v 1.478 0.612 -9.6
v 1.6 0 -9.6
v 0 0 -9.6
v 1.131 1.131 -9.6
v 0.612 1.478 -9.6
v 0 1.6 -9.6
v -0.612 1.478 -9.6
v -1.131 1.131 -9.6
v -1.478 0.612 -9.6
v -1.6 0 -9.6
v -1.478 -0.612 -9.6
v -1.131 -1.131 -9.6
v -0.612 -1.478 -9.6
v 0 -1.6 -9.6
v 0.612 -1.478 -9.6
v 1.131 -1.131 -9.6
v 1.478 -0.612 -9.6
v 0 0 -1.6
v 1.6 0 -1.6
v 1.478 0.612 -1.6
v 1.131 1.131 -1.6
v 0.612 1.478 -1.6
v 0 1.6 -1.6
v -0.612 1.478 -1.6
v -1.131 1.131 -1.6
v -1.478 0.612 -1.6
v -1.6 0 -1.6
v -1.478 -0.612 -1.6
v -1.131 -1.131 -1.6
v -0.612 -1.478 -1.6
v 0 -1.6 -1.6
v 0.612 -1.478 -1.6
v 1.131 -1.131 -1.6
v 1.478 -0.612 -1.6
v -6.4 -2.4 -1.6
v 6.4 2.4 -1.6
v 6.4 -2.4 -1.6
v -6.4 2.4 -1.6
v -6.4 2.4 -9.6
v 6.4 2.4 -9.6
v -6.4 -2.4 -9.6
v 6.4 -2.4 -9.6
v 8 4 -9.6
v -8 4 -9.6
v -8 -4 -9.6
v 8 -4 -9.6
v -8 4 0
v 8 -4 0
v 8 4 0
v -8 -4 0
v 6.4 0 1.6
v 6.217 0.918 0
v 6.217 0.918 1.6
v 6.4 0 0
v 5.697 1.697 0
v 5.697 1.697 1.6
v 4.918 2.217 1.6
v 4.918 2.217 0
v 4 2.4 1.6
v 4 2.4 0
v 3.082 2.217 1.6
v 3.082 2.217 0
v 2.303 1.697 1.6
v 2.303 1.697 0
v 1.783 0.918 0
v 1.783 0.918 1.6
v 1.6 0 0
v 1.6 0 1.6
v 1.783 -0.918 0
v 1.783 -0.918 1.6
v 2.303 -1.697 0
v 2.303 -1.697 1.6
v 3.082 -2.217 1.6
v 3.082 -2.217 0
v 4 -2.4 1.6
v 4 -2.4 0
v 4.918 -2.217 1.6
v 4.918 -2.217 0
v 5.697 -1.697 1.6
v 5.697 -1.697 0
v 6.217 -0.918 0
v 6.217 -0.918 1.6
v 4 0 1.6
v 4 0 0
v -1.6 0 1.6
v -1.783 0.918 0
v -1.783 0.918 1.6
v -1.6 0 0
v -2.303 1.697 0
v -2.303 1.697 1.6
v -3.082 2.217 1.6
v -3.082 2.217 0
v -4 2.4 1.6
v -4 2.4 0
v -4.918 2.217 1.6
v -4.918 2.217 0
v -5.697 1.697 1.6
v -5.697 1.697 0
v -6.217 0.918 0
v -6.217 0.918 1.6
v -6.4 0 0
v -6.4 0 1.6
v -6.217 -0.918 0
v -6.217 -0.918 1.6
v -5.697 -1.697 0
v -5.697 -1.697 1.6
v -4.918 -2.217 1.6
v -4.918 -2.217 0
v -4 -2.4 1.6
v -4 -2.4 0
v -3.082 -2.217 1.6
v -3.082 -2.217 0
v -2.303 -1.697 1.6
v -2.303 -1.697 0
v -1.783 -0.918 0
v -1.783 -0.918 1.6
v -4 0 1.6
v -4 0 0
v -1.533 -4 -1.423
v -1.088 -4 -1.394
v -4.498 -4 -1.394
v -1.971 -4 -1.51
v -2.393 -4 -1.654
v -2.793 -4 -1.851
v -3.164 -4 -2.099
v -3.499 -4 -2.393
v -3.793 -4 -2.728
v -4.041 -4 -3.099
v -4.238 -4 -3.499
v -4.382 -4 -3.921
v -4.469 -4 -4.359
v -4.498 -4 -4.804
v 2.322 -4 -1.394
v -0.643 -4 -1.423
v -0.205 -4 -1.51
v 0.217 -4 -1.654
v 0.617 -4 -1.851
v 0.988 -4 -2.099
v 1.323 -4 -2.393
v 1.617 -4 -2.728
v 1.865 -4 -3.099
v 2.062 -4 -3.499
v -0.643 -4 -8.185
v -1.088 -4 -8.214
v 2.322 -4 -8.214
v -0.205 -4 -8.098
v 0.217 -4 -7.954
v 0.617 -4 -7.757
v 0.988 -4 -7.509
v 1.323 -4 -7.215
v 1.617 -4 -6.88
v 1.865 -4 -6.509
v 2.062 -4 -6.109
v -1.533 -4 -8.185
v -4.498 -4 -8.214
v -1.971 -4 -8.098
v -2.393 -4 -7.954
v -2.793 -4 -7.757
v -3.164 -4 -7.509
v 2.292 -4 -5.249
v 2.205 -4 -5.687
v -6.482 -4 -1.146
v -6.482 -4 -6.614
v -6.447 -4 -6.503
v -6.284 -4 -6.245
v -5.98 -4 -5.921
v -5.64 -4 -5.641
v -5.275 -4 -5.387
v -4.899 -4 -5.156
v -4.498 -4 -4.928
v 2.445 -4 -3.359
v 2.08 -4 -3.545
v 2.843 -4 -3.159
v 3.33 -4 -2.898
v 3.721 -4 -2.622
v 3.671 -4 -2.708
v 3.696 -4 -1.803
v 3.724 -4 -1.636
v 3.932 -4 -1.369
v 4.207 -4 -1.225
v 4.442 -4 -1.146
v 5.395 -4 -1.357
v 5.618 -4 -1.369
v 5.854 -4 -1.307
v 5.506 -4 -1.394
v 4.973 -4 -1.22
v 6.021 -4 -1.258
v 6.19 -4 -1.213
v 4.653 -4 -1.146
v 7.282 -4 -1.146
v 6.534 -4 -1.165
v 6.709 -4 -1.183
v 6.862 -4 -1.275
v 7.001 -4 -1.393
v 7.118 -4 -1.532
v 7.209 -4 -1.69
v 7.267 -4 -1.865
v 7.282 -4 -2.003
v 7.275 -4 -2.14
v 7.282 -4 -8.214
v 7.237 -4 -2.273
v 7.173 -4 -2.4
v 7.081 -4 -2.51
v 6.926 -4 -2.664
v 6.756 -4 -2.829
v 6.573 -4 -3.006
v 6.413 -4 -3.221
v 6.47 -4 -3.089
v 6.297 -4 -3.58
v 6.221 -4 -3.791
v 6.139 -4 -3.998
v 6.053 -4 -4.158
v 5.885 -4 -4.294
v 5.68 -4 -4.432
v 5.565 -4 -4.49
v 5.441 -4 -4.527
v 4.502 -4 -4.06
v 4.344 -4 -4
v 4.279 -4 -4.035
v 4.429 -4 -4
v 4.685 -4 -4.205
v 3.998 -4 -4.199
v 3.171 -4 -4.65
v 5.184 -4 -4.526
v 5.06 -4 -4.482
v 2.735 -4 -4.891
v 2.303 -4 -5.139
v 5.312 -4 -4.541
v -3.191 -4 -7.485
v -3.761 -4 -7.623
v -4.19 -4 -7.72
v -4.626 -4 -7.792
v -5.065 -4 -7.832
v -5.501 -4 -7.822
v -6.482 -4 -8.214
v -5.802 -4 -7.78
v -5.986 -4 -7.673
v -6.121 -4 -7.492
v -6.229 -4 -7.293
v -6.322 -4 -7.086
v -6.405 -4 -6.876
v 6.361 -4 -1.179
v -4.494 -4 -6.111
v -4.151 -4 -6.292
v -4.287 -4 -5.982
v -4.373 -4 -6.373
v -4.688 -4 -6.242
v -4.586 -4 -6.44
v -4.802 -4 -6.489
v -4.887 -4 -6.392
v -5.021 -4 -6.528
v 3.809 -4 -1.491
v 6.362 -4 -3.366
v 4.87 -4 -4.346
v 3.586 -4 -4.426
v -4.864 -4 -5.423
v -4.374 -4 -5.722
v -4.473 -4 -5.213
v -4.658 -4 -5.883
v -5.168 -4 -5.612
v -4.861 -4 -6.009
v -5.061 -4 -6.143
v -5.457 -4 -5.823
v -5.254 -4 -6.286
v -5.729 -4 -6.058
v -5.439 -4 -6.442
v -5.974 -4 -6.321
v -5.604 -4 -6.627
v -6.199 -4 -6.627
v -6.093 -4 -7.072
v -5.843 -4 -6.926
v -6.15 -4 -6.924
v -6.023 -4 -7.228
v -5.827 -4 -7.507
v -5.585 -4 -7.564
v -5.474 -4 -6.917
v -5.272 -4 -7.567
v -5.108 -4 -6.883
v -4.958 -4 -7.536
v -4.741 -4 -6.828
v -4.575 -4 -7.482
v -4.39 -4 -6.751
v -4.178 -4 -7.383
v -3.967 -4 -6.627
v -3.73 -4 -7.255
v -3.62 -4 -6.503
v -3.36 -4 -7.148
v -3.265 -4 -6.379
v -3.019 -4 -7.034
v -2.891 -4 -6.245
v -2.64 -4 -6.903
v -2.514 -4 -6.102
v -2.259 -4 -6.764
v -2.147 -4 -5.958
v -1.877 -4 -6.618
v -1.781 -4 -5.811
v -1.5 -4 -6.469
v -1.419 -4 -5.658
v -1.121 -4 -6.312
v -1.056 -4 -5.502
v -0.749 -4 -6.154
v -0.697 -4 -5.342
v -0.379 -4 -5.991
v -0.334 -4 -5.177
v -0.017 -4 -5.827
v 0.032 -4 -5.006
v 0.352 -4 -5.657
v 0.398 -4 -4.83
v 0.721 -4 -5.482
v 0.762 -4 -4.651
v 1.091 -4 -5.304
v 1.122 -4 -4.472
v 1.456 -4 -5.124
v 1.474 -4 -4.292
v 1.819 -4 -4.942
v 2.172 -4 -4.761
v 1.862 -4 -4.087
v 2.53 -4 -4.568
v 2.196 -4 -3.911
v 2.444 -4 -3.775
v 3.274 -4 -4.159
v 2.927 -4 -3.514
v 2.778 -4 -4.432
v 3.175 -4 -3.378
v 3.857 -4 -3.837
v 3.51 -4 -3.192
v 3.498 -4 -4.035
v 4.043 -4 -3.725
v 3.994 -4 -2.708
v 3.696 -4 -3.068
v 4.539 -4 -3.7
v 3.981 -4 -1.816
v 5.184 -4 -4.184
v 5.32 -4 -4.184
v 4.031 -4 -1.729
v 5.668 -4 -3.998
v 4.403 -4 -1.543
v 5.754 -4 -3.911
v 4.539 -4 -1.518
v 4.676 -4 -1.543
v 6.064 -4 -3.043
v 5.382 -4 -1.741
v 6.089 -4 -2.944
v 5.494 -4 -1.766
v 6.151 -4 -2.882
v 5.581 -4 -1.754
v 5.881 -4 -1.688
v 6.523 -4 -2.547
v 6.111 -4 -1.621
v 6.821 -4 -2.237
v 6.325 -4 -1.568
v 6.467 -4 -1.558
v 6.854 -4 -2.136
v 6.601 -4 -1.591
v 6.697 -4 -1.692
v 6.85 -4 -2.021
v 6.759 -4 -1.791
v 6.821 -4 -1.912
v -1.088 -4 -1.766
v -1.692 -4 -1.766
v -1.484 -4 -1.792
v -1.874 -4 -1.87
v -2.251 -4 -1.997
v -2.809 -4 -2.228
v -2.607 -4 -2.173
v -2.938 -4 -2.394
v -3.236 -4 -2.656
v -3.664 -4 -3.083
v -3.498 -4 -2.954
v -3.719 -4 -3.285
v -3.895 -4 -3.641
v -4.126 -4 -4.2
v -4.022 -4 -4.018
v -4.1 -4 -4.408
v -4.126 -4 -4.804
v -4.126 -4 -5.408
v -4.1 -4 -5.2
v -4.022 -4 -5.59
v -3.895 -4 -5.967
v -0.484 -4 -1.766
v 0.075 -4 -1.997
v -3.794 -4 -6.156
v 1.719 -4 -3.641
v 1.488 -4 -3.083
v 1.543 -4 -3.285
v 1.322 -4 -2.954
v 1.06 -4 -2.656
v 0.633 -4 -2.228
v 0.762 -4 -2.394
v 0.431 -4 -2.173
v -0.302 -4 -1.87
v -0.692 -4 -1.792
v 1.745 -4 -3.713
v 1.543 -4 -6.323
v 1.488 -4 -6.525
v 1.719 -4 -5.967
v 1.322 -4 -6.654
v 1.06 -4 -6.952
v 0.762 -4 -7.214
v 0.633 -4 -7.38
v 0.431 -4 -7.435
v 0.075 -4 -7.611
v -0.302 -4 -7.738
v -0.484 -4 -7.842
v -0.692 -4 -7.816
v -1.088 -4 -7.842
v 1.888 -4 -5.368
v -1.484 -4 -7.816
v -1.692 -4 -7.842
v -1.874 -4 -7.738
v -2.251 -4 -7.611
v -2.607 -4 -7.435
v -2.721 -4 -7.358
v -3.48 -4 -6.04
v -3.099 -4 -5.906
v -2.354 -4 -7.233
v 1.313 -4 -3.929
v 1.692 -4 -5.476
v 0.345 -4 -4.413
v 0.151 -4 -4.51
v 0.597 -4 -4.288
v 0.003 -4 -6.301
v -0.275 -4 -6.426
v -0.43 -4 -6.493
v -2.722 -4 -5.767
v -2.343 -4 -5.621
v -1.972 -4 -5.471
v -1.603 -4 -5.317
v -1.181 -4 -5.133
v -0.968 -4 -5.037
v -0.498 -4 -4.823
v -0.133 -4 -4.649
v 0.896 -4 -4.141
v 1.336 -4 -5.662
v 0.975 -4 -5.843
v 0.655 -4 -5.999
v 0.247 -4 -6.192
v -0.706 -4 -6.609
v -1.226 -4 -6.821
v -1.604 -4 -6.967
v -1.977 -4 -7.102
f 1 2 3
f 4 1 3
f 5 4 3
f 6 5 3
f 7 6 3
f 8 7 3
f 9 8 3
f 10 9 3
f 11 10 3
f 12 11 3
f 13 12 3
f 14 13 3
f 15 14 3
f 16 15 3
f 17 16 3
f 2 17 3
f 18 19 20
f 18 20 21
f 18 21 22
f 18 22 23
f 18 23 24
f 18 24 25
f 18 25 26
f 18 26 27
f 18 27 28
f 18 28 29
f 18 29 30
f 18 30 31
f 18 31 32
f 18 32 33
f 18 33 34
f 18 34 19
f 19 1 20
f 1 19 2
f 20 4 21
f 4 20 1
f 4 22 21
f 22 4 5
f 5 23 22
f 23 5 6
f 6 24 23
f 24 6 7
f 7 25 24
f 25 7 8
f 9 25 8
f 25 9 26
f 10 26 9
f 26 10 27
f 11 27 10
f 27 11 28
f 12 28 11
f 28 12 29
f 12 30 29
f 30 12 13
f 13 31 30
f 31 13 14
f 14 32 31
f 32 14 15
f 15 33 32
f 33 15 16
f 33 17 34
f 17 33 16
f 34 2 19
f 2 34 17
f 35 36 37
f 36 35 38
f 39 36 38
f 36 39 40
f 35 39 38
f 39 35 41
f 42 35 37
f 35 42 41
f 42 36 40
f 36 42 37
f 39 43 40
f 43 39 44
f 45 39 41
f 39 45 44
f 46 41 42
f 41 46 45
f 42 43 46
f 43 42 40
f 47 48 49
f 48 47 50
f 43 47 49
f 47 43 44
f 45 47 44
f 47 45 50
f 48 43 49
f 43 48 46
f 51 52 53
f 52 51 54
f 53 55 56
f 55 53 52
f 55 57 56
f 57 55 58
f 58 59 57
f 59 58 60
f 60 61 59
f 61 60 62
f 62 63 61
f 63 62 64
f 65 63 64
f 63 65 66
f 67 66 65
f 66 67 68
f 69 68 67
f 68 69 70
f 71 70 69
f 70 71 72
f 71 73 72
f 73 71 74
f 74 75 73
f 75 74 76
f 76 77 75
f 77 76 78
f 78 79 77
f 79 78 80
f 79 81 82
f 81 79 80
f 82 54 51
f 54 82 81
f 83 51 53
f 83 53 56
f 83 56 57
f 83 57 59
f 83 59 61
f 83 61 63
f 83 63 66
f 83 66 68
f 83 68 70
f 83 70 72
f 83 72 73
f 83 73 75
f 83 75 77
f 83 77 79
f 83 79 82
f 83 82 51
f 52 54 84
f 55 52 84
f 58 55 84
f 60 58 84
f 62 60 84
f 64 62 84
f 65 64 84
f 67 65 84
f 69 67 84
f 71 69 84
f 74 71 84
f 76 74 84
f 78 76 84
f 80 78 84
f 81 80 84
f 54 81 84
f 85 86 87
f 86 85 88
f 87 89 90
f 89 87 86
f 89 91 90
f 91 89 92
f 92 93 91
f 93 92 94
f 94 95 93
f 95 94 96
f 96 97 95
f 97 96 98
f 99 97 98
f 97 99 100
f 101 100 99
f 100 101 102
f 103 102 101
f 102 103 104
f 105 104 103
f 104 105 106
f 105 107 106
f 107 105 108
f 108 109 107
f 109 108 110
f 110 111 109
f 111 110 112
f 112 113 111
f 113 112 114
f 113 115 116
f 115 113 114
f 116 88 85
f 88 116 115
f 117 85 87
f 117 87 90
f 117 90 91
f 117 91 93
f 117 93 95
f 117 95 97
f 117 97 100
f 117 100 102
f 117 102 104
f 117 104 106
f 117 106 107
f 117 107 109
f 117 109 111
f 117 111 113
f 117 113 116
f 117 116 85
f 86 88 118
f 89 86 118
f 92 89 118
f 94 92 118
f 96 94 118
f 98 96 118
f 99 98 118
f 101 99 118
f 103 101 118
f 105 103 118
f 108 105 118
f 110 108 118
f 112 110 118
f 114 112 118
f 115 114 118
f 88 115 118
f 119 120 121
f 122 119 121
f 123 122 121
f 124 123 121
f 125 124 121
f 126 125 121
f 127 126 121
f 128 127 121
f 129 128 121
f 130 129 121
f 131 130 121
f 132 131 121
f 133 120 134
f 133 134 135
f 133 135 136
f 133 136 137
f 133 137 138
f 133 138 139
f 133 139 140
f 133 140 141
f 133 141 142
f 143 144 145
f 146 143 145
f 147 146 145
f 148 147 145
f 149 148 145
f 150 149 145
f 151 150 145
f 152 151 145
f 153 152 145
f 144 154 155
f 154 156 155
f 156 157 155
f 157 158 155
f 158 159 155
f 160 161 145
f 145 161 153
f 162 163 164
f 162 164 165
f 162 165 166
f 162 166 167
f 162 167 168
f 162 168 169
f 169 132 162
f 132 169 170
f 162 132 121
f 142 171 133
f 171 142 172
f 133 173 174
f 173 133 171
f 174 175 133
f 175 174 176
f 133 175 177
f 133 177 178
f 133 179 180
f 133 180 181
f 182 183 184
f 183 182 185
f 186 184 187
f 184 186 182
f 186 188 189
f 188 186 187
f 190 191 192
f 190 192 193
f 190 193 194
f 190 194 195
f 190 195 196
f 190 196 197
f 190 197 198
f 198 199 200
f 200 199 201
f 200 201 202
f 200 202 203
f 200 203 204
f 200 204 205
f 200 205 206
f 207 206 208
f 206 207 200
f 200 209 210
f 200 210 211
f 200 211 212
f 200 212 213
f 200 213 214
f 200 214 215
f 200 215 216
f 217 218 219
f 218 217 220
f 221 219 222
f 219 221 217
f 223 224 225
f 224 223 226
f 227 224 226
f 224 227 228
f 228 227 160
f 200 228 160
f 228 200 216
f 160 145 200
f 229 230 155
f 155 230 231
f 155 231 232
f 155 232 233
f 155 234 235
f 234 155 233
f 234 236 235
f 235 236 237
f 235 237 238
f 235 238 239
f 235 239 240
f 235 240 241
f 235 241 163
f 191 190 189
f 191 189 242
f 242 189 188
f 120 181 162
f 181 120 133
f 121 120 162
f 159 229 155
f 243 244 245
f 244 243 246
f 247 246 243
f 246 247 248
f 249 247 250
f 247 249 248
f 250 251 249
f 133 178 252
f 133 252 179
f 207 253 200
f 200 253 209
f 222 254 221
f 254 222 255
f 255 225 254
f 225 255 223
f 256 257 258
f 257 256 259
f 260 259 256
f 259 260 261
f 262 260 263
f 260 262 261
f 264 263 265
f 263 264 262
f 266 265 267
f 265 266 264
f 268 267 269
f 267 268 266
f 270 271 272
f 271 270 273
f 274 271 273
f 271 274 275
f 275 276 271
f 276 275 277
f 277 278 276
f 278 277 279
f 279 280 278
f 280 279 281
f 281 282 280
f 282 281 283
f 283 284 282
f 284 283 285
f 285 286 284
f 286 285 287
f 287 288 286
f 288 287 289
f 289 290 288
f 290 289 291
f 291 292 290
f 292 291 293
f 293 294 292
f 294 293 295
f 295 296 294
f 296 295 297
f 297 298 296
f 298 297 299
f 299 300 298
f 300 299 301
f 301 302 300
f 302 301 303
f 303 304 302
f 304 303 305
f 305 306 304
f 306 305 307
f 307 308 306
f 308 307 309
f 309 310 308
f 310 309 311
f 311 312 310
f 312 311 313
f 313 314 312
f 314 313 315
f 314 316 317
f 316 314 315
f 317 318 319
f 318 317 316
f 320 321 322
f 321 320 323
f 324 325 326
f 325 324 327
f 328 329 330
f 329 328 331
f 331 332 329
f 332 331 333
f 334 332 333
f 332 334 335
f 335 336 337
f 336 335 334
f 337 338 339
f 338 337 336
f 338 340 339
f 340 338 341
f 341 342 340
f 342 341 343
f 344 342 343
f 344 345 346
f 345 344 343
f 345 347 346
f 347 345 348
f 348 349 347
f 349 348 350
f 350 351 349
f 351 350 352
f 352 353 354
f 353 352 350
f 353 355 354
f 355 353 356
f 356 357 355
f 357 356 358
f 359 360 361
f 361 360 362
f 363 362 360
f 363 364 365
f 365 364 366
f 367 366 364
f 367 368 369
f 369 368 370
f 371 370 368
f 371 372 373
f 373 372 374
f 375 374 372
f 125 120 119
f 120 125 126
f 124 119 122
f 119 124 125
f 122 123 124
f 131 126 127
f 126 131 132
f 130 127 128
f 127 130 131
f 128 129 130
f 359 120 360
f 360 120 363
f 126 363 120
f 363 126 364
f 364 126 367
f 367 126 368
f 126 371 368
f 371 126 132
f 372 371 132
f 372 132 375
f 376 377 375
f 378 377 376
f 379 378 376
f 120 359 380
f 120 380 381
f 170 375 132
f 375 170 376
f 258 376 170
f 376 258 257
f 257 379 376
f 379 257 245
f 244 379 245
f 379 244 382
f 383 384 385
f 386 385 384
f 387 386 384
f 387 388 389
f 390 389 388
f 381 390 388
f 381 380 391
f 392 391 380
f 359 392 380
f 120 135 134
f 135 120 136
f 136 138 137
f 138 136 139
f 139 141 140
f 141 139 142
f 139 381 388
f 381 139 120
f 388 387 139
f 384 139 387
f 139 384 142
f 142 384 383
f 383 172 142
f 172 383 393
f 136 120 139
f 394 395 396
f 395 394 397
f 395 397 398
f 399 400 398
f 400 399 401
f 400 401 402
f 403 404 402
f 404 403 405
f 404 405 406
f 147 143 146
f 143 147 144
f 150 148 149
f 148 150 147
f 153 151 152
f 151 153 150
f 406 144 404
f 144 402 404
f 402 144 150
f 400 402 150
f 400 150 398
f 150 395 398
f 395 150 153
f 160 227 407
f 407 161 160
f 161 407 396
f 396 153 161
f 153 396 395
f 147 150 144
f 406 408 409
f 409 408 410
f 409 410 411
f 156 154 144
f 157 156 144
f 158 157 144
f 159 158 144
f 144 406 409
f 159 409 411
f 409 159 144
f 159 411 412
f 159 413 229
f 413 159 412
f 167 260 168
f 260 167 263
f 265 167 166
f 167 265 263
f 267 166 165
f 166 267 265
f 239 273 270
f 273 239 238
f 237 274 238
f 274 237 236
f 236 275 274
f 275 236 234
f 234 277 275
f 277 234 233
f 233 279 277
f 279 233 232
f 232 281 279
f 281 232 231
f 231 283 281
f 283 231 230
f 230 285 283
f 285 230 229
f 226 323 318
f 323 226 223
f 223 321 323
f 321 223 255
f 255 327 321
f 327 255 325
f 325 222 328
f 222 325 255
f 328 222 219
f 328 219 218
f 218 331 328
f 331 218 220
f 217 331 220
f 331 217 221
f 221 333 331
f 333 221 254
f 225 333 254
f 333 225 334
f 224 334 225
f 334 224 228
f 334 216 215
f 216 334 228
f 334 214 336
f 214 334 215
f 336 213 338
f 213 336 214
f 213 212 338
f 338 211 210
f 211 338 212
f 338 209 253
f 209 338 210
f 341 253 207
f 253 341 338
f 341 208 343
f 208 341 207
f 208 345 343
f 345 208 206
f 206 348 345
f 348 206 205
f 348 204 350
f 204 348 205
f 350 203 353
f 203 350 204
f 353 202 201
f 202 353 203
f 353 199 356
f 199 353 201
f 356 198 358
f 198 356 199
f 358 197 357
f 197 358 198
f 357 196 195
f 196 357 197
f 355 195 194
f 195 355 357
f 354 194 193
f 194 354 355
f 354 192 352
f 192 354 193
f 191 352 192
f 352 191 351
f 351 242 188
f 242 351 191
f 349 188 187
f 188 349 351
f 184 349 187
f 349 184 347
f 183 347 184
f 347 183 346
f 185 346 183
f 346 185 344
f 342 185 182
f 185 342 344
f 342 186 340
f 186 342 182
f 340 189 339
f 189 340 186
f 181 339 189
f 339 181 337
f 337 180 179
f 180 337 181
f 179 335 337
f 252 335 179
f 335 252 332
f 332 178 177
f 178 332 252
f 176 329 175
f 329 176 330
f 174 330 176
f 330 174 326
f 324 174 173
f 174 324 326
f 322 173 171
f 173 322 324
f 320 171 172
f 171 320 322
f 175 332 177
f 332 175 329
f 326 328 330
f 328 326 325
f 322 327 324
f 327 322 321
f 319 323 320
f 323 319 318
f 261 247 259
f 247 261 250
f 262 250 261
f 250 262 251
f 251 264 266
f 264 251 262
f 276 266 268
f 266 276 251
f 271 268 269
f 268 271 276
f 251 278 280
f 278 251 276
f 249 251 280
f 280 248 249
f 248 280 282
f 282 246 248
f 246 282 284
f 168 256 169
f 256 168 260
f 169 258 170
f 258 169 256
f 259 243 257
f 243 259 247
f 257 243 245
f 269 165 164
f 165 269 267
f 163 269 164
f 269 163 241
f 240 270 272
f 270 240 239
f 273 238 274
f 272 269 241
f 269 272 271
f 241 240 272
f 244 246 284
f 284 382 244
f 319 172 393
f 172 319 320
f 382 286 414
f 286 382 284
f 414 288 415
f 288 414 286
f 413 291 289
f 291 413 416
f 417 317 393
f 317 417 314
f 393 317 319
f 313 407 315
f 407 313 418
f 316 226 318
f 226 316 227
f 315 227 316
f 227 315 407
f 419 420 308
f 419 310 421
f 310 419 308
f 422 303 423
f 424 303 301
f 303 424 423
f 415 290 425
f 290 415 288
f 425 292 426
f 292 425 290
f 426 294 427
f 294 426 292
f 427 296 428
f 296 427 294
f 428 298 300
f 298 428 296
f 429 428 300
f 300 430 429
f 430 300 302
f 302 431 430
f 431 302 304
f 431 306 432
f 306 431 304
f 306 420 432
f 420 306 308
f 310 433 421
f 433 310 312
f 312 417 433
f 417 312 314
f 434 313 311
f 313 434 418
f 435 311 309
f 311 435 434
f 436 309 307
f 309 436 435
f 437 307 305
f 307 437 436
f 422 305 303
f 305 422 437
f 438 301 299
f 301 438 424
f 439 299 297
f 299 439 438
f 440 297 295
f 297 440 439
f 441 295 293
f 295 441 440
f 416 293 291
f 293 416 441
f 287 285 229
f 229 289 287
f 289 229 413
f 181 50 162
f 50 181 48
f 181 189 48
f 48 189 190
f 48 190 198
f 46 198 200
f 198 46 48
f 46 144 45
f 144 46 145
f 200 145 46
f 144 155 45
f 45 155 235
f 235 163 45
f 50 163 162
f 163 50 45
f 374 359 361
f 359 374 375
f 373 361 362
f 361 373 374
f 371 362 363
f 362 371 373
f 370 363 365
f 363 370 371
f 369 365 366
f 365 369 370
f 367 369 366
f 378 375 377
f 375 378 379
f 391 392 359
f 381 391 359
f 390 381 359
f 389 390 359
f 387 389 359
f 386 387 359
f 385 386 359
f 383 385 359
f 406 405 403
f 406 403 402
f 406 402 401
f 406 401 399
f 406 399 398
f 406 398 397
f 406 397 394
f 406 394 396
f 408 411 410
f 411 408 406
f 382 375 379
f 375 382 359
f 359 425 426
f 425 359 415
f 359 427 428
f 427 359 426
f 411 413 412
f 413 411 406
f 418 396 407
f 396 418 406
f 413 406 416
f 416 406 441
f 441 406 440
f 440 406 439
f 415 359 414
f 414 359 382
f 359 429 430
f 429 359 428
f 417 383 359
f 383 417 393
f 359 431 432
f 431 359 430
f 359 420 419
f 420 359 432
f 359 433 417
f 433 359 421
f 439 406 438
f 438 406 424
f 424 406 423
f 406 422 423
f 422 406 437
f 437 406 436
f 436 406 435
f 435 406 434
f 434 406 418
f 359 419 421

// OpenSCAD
use <../lib.scad>
use <../p/logo-classic-space-border.scad>
use <../p/logo-classic-space-box.scad>
use <../p/logo-classic-space-planet.scad>
use <../p/logo-classic-space-spaceship.scad>
use <s/3004s01.scad>
function ldraw_lib__3004p90() = [
// 0 Brick  1 x  2 with Classic Space Logo Pattern
// 0 Name: 3004p90.dat
// 0 Author: Chris Dee [cwdee]
// 0 !LDRAW_ORG Part UPDATE 2026-05
// 0 !LICENSE Licensed under CC BY 4.0 : see CAreadme.txt
// 
// 0 BFC CERTIFY CCW
  [0,"BFC","CERTIFY"],
  [0,"BFC","CCW"],
// 
// 0 !KEYWORDS Brickowl 324427, Rebrickable 3004pr9970, Set 6970, Set 6985, Set 924
// 0 !KEYWORDS Set 926, Set 928
// 
// 0 !HISTORY 2000-05-07 [PTadmin] Official Update 2000-01
// 0 !HISTORY 2002-08-19 [Holly-Wood] refined pattern, separated into subpart
// 0 !HISTORY 2002-12-31 [PTadmin] Official Update 2002-06
// 0 !HISTORY 2007-05-07 [PTadmin] Header formatted for Contributor Agreement
// 0 !HISTORY 2008-07-01 [PTadmin] Official Update 2008-01
// 0 !HISTORY 2013-08-07 [Steffen] BFCed, inlined subparts, changed gold color to 82
// 0 !HISTORY 2013-11-30 [MagFors] Removed T-junctions, Reused corrected pattern subfiles
// 0 !HISTORY 2014-06-21 [PTadmin] Official Update 2014-01
// 0 !HISTORY 2025-09-27 [OrionP] Changed winding to CCW
// 0 !HISTORY 2025-09-29 [OrionP] Official Update 2025-09
// 0 !HISTORY 2026-03-30 [jb70] Using Logo Primitives
// 0 !HISTORY 2026-05-31 [OrionP] Official Update 2026-05
// 
// 1 16 0 0 0 1 0 0 0 1 0 0 0 1 s\3004s01.dat
  [1,16,0,0,0,1,0,0,0,1,0,0,0,1, ldraw_lib__s__3004s01()],
// 1 16 1 11.7 -10 .31 0 0 0 0 -.31 0 1 0 logo-classic-space-box.dat
  [1,16,1,11.7,-10,.31,0,0,0,0,-.31,0,1,0, ldraw_lib__logo_classic_space_box()],
// 1 4 1 11.7 -10 .31 0 0 0 0 -.31 0 1 0 logo-classic-space-spaceship.dat
  [1,4,1,11.7,-10,.31,0,0,0,0,-.31,0,1,0, ldraw_lib__logo_classic_space_spaceship()],
// 1 15 1 11.7 -10 .31 0 0 0 0 -.31 0 1 0 logo-classic-space-border.dat
  [1,15,1,11.7,-10,.31,0,0,0,0,-.31,0,1,0, ldraw_lib__logo_classic_space_border()],
// 4 16 -20 0 -10 -16.205 2.865 -10 11.106 2.865 -10 20 0 -10
  [4,16,-20,0,-10,-16.205,2.865,-10,11.106,2.865,-10,20,0,-10],
// 3 16 11.106 2.865 -10 11.633 2.865 -10 20 0 -10
  [3,16,11.106,2.865,-10,11.633,2.865,-10,20,0,-10],
// 3 16 20 0 -10 11.633 2.865 -10 18.205 2.865 -10
  [3,16,20,0,-10,11.633,2.865,-10,18.205,2.865,-10],
// 3 16 20 0 -10 18.205 2.865 -10 18.205 5.0071 -10
  [3,16,20,0,-10,18.205,2.865,-10,18.205,5.0071,-10],
// 4 16 20 0 -10 18.205 5.0071 -10 18.205 20.535 -10 20 24 -10
  [4,16,20,0,-10,18.205,5.0071,-10,18.205,20.535,-10,20,24,-10],
// 4 16 -2.72 20.535 -10 -20 24 -10 20 24 -10 5.805 20.535 -10
  [4,16,-2.72,20.535,-10,-20,24,-10,20,24,-10,5.805,20.535,-10],
// 3 16 18.205 20.535 -10 5.805 20.535 -10 20 24 -10
  [3,16,18.205,20.535,-10,5.805,20.535,-10,20,24,-10],
// 3 16 -2.72 20.535 -10 -11.245 20.535 -10 -20 24 -10
  [3,16,-2.72,20.535,-10,-11.245,20.535,-10,-20,24,-10],
// 3 16 -20 24 -10 -11.245 20.535 -10 -16.205 20.535 -10
  [3,16,-20,24,-10,-11.245,20.535,-10,-16.205,20.535,-10],
// 3 16 -16.205 20.535 -10 -16.205 16.536 -10 -20 24 -10
  [3,16,-16.205,20.535,-10,-16.205,16.536,-10,-20,24,-10],
// 4 16 -20 24 -10 -16.205 16.536 -10 -16.205 2.865 -10 -20 0 -10
  [4,16,-20,24,-10,-16.205,16.536,-10,-16.205,2.865,-10,-20,0,-10],
// 1 82 1 11.7 -10 .31 0 0 0 0 -.31 0 1 0 logo-classic-space-planet.dat
  [1,82,1,11.7,-10,.31,0,0,0,0,-.31,0,1,0, ldraw_lib__logo_classic_space_planet()],
];
module ldraw_lib__3004p90(step=0, col=false, unit=2/5, alt=false, line=0.2, solid=!$preview)
    makepoly(ldraw_lib__3004p90(), step=step, col=col, unit=unit, alt=alt, line=line, solid=solid);
ldraw_lib__3004p90(line=0.2);
